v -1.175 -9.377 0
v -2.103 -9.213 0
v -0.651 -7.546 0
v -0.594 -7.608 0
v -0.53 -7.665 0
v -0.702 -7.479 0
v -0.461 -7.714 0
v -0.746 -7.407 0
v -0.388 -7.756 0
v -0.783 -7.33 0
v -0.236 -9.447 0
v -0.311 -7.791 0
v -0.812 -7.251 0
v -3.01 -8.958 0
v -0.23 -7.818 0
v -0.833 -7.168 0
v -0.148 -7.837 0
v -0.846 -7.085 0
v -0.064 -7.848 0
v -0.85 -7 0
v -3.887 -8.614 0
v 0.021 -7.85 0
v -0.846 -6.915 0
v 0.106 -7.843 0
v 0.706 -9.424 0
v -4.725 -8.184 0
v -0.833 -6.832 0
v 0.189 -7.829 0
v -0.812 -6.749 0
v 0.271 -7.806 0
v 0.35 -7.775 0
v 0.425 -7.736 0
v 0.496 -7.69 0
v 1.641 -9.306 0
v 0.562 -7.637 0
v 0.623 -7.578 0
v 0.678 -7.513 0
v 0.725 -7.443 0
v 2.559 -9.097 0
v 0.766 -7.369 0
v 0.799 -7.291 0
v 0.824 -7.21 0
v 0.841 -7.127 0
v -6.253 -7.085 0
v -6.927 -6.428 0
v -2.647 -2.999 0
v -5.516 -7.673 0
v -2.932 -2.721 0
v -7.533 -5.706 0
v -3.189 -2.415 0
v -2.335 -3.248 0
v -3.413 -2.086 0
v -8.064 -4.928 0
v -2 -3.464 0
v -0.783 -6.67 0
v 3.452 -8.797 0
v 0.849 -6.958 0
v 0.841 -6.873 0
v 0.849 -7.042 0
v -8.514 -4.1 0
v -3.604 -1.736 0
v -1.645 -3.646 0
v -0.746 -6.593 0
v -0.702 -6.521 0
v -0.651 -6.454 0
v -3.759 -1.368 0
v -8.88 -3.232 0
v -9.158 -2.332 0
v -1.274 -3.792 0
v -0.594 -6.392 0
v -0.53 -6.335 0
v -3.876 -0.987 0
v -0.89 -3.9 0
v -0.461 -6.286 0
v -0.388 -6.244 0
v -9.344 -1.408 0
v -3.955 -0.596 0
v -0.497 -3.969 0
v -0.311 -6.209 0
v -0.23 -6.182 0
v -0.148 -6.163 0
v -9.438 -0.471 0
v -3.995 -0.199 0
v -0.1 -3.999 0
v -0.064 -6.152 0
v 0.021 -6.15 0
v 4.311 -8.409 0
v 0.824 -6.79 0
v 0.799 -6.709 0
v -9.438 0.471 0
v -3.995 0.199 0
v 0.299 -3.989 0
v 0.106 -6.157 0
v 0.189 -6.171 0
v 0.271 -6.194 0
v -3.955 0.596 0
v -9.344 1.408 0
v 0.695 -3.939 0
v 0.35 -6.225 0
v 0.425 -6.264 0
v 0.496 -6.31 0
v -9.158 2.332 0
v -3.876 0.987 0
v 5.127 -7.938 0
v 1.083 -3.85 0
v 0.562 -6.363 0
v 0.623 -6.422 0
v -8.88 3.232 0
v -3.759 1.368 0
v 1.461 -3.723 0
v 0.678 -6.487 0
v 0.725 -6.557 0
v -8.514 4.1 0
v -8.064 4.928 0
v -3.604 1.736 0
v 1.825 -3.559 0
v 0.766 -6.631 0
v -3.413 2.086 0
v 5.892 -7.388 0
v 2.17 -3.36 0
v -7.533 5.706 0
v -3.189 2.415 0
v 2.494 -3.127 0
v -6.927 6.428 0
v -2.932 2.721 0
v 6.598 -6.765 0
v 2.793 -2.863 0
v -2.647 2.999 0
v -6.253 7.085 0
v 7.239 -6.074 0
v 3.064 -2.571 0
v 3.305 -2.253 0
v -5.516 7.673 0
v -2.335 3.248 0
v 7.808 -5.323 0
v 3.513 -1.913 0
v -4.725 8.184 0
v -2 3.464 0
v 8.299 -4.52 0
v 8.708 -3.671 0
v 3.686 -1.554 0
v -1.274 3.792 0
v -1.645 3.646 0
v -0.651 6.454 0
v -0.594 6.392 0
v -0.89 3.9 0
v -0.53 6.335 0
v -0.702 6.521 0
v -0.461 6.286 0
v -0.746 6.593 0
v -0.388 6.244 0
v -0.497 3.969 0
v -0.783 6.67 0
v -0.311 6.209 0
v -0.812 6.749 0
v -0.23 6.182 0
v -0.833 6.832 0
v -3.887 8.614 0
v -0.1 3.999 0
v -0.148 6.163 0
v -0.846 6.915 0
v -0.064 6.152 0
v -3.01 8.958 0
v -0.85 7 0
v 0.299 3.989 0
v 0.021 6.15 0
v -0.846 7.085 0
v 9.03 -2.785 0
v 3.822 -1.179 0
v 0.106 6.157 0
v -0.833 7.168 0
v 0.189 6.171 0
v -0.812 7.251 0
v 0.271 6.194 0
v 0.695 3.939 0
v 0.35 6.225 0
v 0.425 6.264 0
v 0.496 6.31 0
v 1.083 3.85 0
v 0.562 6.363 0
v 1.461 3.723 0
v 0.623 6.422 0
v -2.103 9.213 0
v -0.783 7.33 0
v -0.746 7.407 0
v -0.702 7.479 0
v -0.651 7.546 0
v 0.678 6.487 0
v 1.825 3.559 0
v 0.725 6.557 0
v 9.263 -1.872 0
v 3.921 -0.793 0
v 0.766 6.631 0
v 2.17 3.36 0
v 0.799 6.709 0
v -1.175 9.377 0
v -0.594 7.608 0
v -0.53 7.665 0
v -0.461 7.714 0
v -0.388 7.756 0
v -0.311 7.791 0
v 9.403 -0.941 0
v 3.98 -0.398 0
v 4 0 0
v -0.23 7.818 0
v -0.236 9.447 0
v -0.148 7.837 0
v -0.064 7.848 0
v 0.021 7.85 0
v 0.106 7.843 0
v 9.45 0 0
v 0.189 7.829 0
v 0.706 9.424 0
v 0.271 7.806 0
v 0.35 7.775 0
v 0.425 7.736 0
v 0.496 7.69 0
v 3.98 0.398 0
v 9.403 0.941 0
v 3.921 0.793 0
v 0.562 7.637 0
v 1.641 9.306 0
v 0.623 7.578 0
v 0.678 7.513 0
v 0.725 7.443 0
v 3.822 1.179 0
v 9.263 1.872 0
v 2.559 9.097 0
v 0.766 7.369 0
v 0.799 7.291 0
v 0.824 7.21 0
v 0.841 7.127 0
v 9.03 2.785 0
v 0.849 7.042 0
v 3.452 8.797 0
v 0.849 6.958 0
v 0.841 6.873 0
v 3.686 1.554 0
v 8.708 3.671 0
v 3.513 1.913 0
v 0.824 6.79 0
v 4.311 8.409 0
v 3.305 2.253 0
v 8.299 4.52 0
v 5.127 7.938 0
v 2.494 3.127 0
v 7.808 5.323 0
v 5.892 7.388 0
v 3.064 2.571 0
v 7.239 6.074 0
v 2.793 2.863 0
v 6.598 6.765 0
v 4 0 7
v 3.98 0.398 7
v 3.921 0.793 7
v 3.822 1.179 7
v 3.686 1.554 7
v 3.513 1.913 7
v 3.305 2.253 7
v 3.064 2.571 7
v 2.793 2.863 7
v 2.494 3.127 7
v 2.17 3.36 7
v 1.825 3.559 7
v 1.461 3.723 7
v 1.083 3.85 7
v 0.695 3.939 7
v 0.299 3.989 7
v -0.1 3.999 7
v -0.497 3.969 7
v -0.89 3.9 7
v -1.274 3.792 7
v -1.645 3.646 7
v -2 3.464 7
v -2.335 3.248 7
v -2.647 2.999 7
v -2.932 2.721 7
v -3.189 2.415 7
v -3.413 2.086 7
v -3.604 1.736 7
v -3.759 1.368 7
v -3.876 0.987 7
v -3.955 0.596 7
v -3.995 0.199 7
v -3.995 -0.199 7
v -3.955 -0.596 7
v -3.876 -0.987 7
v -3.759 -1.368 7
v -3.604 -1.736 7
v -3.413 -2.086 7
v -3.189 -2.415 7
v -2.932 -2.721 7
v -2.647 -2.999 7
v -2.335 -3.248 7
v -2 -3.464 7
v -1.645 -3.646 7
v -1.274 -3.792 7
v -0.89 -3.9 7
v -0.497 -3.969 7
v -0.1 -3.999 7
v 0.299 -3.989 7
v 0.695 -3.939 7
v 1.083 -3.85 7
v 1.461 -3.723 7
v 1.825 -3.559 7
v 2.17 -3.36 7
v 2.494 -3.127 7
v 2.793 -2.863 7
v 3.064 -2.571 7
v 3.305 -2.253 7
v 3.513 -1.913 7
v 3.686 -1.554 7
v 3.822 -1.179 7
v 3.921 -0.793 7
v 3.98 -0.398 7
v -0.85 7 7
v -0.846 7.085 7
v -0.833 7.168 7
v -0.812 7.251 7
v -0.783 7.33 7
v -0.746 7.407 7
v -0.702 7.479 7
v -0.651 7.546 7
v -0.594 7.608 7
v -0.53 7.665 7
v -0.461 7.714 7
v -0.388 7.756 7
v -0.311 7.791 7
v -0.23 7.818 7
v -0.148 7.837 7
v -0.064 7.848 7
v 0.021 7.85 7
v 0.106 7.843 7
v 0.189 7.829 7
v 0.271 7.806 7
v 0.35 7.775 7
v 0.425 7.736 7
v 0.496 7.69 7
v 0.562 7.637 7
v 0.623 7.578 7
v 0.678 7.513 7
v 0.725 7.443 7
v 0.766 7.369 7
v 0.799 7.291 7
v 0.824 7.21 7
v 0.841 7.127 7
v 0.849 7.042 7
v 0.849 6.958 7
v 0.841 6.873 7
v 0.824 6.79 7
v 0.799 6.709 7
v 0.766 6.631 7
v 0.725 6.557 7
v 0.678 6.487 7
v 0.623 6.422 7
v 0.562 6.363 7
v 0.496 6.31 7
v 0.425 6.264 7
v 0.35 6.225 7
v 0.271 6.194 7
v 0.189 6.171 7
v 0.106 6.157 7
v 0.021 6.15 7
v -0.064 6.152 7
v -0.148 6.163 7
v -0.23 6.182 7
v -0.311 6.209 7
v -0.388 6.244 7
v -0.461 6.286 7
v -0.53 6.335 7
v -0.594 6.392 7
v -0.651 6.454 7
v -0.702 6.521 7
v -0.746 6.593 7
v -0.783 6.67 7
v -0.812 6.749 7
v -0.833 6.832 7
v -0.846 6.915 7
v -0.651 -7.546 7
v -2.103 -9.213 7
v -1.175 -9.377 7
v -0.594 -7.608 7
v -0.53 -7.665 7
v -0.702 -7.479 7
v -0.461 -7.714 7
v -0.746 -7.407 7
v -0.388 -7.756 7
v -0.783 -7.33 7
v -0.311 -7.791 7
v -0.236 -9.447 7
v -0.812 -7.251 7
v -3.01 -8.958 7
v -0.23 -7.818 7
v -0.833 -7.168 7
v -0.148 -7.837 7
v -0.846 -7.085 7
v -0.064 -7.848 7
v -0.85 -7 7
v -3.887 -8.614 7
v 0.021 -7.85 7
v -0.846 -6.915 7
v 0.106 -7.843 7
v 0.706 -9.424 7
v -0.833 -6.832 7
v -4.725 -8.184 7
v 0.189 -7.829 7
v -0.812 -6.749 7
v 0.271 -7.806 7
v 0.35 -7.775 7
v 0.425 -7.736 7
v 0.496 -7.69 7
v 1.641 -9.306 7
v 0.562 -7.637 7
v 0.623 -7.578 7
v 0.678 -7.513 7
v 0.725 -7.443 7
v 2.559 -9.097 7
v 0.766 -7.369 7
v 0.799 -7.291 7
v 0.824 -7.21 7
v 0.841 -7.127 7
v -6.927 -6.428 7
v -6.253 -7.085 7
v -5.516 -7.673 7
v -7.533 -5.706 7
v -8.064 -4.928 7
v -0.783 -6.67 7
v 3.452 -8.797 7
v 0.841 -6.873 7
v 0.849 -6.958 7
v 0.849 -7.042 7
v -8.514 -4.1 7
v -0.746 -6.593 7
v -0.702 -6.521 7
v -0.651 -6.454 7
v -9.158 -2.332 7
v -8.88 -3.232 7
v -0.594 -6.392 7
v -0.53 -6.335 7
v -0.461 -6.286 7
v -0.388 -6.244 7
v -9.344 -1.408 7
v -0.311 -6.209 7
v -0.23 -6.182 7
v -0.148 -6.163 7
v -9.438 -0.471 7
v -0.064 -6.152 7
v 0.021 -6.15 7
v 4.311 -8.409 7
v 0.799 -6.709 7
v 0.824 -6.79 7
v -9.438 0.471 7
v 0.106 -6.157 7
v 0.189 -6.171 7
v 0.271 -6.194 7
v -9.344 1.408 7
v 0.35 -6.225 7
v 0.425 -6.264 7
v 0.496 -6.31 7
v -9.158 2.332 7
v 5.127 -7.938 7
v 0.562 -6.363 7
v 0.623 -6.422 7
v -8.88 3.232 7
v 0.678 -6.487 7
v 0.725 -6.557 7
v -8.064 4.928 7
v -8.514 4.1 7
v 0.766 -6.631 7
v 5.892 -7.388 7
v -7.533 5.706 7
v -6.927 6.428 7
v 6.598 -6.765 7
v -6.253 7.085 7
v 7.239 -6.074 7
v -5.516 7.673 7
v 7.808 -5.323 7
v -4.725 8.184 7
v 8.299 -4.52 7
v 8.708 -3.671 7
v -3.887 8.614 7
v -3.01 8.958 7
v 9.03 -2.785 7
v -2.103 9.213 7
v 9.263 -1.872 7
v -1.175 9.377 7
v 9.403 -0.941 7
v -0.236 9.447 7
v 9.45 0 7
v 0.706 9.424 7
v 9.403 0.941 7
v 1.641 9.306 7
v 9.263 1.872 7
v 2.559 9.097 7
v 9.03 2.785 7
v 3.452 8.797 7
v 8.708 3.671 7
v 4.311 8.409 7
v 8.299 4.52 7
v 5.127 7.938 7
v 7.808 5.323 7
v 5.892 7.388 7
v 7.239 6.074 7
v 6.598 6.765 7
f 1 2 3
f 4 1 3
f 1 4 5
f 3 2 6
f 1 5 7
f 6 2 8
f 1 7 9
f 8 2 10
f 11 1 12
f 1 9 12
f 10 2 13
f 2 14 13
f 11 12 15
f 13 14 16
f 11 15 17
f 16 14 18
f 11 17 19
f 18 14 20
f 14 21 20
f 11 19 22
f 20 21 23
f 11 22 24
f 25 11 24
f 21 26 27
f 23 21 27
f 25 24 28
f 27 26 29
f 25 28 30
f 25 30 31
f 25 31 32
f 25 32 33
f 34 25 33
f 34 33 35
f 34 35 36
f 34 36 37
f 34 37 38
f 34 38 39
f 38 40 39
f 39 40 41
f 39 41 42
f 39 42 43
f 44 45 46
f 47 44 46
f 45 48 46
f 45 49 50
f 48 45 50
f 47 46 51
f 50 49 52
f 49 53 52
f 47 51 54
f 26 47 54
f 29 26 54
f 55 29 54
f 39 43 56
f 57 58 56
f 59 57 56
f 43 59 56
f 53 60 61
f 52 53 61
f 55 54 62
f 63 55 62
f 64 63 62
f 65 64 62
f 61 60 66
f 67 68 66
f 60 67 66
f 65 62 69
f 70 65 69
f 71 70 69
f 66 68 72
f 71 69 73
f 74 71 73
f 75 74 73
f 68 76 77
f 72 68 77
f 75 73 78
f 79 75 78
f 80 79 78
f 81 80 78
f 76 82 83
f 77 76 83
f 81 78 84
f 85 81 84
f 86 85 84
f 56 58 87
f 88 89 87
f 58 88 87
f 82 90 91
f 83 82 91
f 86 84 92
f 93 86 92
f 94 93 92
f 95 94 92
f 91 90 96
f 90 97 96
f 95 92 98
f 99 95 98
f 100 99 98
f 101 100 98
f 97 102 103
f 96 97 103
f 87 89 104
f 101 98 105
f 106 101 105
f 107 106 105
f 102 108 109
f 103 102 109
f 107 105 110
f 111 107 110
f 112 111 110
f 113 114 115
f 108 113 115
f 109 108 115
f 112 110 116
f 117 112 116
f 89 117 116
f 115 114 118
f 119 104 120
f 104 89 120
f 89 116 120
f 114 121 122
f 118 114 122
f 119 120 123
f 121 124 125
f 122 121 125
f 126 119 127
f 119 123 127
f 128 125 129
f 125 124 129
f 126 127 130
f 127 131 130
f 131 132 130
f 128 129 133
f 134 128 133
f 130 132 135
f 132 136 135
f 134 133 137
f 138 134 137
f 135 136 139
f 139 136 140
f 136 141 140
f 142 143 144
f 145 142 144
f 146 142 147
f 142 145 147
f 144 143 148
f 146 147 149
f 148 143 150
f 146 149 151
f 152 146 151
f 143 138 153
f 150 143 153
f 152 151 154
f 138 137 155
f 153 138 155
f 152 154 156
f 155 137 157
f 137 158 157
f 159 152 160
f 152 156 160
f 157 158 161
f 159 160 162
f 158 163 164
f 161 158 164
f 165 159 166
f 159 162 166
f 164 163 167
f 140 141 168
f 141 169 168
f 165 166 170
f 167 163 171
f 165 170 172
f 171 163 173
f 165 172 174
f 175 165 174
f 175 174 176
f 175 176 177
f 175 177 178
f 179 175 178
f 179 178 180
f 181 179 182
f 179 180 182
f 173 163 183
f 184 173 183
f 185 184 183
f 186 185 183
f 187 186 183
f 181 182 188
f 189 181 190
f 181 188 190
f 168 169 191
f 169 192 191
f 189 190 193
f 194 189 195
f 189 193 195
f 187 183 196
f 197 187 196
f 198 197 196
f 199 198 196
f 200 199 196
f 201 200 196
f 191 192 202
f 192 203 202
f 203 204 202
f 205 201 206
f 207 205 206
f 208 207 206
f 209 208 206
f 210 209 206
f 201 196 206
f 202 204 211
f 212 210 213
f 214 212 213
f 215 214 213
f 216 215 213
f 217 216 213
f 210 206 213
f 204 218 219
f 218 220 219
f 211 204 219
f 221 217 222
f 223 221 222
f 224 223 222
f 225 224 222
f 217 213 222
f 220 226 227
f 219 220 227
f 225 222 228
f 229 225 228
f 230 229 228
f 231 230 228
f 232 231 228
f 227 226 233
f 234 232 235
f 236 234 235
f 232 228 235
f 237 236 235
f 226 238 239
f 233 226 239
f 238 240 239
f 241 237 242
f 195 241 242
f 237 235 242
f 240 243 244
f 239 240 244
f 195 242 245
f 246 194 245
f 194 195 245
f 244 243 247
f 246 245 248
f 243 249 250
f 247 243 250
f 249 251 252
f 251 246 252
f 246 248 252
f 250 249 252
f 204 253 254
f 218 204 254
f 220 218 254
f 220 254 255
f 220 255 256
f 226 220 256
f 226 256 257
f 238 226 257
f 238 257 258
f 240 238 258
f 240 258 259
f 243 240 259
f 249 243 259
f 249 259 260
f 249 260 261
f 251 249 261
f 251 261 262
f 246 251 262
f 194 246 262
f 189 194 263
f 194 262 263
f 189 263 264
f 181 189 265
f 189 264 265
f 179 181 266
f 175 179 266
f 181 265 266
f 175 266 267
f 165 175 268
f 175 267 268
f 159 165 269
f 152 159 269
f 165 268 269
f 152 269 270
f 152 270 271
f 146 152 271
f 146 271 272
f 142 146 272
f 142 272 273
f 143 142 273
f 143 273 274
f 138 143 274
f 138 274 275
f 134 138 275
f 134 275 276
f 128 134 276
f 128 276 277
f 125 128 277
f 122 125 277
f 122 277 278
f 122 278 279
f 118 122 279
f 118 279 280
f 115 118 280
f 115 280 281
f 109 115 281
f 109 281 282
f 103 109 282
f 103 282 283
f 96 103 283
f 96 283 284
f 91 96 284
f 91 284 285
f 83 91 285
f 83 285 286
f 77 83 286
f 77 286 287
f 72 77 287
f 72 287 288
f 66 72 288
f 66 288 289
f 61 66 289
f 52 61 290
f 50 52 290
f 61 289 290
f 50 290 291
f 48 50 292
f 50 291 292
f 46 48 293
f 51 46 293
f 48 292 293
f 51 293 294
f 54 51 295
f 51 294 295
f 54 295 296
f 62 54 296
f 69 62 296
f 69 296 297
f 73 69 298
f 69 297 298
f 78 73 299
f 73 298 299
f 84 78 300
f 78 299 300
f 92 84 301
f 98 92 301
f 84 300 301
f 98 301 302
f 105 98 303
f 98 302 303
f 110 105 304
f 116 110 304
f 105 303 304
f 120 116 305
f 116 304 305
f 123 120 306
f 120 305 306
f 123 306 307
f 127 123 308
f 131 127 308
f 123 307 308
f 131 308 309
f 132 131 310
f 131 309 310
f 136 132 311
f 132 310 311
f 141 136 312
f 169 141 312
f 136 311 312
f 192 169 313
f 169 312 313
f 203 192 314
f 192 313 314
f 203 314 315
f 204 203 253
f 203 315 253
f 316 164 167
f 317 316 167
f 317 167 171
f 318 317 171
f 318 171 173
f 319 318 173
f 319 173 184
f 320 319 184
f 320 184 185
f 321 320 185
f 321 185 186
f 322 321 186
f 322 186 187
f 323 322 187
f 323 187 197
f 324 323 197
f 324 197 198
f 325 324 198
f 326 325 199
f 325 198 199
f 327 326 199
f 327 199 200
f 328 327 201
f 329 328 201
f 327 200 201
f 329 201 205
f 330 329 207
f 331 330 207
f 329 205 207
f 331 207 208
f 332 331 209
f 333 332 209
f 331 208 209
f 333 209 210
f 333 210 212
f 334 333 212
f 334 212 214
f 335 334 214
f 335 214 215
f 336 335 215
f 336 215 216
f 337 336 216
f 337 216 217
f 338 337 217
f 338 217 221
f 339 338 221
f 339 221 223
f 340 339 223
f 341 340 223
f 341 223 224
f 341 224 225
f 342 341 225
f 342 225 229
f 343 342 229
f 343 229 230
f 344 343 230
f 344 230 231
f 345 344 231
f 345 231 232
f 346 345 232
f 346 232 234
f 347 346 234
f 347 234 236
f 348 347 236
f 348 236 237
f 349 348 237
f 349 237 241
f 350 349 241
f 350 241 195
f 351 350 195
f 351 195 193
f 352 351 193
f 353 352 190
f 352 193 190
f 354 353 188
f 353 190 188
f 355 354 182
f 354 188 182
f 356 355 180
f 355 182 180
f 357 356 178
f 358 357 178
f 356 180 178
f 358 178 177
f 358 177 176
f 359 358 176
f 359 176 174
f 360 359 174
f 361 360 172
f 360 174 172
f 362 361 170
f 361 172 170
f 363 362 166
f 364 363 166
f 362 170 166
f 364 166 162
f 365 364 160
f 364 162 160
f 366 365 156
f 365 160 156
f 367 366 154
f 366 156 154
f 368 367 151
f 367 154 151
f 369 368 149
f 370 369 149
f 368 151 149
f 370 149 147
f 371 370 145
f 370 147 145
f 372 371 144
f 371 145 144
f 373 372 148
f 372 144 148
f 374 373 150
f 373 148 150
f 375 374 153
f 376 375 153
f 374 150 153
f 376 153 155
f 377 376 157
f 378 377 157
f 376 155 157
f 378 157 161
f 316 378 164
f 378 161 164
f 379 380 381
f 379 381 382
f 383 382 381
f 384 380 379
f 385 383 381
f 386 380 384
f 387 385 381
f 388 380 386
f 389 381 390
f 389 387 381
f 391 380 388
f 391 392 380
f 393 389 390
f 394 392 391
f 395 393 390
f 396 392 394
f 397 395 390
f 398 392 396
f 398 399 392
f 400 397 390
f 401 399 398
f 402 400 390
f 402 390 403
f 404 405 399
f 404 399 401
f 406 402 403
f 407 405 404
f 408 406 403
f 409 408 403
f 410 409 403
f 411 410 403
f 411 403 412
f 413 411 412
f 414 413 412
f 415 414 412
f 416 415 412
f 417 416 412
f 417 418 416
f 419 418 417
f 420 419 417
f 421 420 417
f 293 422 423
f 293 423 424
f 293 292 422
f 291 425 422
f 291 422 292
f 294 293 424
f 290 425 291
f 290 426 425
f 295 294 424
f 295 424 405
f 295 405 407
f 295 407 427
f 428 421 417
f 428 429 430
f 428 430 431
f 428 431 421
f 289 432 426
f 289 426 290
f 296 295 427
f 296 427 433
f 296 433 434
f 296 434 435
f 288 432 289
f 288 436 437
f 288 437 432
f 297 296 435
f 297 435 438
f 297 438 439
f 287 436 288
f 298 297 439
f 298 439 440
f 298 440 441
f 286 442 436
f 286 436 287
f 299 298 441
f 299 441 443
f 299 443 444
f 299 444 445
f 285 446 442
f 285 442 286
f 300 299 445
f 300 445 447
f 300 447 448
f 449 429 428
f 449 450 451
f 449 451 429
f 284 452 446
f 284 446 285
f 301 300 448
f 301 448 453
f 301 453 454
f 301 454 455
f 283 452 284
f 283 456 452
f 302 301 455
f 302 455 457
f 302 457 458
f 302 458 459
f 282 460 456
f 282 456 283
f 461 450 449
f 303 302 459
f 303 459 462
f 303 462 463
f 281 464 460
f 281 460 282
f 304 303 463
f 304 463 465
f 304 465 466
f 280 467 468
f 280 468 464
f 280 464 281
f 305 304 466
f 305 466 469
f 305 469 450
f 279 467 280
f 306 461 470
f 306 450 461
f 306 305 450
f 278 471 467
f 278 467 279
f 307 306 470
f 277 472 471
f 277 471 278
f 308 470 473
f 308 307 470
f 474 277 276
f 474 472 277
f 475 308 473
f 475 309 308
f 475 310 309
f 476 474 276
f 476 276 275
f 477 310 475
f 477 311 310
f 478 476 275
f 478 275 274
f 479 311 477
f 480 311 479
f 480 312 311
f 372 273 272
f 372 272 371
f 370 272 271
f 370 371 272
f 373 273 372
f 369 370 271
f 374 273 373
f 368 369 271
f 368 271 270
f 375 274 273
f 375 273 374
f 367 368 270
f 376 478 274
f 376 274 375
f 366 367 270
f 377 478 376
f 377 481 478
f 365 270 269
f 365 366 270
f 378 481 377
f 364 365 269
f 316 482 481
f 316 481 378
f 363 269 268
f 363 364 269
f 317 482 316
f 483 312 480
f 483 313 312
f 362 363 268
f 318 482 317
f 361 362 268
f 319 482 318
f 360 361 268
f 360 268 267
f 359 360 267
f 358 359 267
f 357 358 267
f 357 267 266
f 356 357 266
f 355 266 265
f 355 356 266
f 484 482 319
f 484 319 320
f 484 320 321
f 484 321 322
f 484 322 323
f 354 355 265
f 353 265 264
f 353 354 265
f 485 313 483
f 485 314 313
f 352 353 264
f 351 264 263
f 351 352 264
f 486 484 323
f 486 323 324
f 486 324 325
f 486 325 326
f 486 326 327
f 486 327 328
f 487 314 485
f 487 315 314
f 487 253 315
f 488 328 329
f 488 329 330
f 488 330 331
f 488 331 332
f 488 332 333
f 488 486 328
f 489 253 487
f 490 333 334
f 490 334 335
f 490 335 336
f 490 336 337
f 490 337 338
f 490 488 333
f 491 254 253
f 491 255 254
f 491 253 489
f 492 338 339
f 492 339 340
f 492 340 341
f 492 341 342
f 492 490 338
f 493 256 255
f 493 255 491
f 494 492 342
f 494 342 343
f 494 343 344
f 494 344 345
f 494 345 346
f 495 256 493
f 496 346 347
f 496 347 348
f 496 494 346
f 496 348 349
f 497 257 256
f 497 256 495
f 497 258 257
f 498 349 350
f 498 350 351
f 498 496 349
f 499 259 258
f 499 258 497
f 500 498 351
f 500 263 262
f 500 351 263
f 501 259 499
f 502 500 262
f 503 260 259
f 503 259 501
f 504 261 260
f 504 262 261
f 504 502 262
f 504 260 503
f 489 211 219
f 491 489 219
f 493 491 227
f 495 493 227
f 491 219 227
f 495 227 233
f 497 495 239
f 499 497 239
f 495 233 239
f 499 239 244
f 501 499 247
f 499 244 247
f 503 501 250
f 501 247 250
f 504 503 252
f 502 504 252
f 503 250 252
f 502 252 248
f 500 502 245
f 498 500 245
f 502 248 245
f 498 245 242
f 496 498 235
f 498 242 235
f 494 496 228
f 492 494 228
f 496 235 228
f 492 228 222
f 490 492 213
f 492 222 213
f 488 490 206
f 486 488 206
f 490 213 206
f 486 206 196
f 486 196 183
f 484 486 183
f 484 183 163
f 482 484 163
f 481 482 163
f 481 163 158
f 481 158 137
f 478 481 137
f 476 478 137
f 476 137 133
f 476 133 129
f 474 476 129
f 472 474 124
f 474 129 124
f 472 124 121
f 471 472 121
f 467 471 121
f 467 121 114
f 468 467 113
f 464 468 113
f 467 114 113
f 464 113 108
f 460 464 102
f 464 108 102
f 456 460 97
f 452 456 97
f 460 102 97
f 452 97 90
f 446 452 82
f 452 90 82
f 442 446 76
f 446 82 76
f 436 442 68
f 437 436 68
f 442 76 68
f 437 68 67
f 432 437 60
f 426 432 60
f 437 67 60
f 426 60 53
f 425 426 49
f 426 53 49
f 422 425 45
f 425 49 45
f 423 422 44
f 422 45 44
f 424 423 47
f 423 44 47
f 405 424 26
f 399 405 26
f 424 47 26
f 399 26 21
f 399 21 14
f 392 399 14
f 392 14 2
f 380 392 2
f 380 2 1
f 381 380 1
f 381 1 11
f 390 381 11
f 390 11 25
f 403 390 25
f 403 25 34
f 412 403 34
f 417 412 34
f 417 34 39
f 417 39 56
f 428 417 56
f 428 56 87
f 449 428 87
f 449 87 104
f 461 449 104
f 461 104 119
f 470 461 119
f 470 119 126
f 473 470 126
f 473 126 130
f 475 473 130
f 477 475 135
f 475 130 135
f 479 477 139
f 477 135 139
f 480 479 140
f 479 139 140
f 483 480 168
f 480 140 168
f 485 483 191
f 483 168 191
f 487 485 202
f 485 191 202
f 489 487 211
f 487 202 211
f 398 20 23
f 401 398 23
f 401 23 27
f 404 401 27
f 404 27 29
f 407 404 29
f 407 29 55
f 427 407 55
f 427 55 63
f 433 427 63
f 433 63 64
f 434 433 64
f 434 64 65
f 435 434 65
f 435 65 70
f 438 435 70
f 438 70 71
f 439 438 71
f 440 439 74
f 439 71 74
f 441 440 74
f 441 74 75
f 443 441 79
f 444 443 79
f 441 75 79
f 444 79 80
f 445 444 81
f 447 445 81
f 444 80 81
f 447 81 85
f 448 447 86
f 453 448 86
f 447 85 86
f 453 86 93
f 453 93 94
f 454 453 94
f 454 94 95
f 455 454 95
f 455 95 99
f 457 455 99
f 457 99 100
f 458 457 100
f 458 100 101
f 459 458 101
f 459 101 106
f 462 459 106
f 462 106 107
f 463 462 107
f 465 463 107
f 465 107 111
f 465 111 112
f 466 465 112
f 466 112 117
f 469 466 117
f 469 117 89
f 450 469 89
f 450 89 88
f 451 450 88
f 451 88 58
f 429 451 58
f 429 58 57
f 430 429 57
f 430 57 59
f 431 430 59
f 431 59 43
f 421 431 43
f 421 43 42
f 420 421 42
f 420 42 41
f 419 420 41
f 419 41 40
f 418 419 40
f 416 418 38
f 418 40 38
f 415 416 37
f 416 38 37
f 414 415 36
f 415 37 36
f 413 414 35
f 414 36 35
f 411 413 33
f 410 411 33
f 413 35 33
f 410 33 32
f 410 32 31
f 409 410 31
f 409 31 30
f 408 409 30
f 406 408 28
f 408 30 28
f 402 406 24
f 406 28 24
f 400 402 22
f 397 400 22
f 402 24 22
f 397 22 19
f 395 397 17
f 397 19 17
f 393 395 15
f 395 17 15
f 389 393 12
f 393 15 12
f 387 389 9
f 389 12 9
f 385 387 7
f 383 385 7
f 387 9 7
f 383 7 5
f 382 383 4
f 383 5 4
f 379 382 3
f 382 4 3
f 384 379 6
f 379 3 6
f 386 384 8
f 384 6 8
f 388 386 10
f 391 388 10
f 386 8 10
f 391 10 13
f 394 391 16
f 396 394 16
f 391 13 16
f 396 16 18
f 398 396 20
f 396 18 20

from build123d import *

# Parameters (mm, degrees)
SKETCH1_R                      = 9.45
BOSS_EXTRUDE1_DEPTH            = 7
CUT_EXTRUDE1_REACH             = 17.087
SKETCH2_R                      = 4
TAP_DRILL_FOR_M2_5X0_45_TAP1_D = 1.7


with BuildPart() as part:
    # Sketch1 → Boss-Extrude1 (new body)
    with BuildSketch(Plane.XY):
        Circle(SKETCH1_R)
    extrude(amount=BOSS_EXTRUDE1_DEPTH)

    # Sketch2 → Cut-Extrude1 (cut, up to next)
    with BuildSketch(Plane.XY.offset(7), mode=Mode.PRIVATE) as cut_extrude1_sk1:
        Circle(SKETCH2_R)
    cut_extrude1_tool1 = extrude(cut_extrude1_sk1.sketch, amount=-CUT_EXTRUDE1_REACH, mode=Mode.PRIVATE) & part.part
    add(cut_extrude1_tool1.solids().sort_by_distance((0, 0, 7))[0], mode=Mode.SUBTRACT)

    # Tap Drill for M2.5x0.45 Tap1 (through all)
    with Locations(Plane.XY.offset(7)):
        with Locations((0, 7), (0, -7)):
            Hole(TAP_DRILL_FOR_M2_5X0_45_TAP1_D / 2)


solid = part.part
